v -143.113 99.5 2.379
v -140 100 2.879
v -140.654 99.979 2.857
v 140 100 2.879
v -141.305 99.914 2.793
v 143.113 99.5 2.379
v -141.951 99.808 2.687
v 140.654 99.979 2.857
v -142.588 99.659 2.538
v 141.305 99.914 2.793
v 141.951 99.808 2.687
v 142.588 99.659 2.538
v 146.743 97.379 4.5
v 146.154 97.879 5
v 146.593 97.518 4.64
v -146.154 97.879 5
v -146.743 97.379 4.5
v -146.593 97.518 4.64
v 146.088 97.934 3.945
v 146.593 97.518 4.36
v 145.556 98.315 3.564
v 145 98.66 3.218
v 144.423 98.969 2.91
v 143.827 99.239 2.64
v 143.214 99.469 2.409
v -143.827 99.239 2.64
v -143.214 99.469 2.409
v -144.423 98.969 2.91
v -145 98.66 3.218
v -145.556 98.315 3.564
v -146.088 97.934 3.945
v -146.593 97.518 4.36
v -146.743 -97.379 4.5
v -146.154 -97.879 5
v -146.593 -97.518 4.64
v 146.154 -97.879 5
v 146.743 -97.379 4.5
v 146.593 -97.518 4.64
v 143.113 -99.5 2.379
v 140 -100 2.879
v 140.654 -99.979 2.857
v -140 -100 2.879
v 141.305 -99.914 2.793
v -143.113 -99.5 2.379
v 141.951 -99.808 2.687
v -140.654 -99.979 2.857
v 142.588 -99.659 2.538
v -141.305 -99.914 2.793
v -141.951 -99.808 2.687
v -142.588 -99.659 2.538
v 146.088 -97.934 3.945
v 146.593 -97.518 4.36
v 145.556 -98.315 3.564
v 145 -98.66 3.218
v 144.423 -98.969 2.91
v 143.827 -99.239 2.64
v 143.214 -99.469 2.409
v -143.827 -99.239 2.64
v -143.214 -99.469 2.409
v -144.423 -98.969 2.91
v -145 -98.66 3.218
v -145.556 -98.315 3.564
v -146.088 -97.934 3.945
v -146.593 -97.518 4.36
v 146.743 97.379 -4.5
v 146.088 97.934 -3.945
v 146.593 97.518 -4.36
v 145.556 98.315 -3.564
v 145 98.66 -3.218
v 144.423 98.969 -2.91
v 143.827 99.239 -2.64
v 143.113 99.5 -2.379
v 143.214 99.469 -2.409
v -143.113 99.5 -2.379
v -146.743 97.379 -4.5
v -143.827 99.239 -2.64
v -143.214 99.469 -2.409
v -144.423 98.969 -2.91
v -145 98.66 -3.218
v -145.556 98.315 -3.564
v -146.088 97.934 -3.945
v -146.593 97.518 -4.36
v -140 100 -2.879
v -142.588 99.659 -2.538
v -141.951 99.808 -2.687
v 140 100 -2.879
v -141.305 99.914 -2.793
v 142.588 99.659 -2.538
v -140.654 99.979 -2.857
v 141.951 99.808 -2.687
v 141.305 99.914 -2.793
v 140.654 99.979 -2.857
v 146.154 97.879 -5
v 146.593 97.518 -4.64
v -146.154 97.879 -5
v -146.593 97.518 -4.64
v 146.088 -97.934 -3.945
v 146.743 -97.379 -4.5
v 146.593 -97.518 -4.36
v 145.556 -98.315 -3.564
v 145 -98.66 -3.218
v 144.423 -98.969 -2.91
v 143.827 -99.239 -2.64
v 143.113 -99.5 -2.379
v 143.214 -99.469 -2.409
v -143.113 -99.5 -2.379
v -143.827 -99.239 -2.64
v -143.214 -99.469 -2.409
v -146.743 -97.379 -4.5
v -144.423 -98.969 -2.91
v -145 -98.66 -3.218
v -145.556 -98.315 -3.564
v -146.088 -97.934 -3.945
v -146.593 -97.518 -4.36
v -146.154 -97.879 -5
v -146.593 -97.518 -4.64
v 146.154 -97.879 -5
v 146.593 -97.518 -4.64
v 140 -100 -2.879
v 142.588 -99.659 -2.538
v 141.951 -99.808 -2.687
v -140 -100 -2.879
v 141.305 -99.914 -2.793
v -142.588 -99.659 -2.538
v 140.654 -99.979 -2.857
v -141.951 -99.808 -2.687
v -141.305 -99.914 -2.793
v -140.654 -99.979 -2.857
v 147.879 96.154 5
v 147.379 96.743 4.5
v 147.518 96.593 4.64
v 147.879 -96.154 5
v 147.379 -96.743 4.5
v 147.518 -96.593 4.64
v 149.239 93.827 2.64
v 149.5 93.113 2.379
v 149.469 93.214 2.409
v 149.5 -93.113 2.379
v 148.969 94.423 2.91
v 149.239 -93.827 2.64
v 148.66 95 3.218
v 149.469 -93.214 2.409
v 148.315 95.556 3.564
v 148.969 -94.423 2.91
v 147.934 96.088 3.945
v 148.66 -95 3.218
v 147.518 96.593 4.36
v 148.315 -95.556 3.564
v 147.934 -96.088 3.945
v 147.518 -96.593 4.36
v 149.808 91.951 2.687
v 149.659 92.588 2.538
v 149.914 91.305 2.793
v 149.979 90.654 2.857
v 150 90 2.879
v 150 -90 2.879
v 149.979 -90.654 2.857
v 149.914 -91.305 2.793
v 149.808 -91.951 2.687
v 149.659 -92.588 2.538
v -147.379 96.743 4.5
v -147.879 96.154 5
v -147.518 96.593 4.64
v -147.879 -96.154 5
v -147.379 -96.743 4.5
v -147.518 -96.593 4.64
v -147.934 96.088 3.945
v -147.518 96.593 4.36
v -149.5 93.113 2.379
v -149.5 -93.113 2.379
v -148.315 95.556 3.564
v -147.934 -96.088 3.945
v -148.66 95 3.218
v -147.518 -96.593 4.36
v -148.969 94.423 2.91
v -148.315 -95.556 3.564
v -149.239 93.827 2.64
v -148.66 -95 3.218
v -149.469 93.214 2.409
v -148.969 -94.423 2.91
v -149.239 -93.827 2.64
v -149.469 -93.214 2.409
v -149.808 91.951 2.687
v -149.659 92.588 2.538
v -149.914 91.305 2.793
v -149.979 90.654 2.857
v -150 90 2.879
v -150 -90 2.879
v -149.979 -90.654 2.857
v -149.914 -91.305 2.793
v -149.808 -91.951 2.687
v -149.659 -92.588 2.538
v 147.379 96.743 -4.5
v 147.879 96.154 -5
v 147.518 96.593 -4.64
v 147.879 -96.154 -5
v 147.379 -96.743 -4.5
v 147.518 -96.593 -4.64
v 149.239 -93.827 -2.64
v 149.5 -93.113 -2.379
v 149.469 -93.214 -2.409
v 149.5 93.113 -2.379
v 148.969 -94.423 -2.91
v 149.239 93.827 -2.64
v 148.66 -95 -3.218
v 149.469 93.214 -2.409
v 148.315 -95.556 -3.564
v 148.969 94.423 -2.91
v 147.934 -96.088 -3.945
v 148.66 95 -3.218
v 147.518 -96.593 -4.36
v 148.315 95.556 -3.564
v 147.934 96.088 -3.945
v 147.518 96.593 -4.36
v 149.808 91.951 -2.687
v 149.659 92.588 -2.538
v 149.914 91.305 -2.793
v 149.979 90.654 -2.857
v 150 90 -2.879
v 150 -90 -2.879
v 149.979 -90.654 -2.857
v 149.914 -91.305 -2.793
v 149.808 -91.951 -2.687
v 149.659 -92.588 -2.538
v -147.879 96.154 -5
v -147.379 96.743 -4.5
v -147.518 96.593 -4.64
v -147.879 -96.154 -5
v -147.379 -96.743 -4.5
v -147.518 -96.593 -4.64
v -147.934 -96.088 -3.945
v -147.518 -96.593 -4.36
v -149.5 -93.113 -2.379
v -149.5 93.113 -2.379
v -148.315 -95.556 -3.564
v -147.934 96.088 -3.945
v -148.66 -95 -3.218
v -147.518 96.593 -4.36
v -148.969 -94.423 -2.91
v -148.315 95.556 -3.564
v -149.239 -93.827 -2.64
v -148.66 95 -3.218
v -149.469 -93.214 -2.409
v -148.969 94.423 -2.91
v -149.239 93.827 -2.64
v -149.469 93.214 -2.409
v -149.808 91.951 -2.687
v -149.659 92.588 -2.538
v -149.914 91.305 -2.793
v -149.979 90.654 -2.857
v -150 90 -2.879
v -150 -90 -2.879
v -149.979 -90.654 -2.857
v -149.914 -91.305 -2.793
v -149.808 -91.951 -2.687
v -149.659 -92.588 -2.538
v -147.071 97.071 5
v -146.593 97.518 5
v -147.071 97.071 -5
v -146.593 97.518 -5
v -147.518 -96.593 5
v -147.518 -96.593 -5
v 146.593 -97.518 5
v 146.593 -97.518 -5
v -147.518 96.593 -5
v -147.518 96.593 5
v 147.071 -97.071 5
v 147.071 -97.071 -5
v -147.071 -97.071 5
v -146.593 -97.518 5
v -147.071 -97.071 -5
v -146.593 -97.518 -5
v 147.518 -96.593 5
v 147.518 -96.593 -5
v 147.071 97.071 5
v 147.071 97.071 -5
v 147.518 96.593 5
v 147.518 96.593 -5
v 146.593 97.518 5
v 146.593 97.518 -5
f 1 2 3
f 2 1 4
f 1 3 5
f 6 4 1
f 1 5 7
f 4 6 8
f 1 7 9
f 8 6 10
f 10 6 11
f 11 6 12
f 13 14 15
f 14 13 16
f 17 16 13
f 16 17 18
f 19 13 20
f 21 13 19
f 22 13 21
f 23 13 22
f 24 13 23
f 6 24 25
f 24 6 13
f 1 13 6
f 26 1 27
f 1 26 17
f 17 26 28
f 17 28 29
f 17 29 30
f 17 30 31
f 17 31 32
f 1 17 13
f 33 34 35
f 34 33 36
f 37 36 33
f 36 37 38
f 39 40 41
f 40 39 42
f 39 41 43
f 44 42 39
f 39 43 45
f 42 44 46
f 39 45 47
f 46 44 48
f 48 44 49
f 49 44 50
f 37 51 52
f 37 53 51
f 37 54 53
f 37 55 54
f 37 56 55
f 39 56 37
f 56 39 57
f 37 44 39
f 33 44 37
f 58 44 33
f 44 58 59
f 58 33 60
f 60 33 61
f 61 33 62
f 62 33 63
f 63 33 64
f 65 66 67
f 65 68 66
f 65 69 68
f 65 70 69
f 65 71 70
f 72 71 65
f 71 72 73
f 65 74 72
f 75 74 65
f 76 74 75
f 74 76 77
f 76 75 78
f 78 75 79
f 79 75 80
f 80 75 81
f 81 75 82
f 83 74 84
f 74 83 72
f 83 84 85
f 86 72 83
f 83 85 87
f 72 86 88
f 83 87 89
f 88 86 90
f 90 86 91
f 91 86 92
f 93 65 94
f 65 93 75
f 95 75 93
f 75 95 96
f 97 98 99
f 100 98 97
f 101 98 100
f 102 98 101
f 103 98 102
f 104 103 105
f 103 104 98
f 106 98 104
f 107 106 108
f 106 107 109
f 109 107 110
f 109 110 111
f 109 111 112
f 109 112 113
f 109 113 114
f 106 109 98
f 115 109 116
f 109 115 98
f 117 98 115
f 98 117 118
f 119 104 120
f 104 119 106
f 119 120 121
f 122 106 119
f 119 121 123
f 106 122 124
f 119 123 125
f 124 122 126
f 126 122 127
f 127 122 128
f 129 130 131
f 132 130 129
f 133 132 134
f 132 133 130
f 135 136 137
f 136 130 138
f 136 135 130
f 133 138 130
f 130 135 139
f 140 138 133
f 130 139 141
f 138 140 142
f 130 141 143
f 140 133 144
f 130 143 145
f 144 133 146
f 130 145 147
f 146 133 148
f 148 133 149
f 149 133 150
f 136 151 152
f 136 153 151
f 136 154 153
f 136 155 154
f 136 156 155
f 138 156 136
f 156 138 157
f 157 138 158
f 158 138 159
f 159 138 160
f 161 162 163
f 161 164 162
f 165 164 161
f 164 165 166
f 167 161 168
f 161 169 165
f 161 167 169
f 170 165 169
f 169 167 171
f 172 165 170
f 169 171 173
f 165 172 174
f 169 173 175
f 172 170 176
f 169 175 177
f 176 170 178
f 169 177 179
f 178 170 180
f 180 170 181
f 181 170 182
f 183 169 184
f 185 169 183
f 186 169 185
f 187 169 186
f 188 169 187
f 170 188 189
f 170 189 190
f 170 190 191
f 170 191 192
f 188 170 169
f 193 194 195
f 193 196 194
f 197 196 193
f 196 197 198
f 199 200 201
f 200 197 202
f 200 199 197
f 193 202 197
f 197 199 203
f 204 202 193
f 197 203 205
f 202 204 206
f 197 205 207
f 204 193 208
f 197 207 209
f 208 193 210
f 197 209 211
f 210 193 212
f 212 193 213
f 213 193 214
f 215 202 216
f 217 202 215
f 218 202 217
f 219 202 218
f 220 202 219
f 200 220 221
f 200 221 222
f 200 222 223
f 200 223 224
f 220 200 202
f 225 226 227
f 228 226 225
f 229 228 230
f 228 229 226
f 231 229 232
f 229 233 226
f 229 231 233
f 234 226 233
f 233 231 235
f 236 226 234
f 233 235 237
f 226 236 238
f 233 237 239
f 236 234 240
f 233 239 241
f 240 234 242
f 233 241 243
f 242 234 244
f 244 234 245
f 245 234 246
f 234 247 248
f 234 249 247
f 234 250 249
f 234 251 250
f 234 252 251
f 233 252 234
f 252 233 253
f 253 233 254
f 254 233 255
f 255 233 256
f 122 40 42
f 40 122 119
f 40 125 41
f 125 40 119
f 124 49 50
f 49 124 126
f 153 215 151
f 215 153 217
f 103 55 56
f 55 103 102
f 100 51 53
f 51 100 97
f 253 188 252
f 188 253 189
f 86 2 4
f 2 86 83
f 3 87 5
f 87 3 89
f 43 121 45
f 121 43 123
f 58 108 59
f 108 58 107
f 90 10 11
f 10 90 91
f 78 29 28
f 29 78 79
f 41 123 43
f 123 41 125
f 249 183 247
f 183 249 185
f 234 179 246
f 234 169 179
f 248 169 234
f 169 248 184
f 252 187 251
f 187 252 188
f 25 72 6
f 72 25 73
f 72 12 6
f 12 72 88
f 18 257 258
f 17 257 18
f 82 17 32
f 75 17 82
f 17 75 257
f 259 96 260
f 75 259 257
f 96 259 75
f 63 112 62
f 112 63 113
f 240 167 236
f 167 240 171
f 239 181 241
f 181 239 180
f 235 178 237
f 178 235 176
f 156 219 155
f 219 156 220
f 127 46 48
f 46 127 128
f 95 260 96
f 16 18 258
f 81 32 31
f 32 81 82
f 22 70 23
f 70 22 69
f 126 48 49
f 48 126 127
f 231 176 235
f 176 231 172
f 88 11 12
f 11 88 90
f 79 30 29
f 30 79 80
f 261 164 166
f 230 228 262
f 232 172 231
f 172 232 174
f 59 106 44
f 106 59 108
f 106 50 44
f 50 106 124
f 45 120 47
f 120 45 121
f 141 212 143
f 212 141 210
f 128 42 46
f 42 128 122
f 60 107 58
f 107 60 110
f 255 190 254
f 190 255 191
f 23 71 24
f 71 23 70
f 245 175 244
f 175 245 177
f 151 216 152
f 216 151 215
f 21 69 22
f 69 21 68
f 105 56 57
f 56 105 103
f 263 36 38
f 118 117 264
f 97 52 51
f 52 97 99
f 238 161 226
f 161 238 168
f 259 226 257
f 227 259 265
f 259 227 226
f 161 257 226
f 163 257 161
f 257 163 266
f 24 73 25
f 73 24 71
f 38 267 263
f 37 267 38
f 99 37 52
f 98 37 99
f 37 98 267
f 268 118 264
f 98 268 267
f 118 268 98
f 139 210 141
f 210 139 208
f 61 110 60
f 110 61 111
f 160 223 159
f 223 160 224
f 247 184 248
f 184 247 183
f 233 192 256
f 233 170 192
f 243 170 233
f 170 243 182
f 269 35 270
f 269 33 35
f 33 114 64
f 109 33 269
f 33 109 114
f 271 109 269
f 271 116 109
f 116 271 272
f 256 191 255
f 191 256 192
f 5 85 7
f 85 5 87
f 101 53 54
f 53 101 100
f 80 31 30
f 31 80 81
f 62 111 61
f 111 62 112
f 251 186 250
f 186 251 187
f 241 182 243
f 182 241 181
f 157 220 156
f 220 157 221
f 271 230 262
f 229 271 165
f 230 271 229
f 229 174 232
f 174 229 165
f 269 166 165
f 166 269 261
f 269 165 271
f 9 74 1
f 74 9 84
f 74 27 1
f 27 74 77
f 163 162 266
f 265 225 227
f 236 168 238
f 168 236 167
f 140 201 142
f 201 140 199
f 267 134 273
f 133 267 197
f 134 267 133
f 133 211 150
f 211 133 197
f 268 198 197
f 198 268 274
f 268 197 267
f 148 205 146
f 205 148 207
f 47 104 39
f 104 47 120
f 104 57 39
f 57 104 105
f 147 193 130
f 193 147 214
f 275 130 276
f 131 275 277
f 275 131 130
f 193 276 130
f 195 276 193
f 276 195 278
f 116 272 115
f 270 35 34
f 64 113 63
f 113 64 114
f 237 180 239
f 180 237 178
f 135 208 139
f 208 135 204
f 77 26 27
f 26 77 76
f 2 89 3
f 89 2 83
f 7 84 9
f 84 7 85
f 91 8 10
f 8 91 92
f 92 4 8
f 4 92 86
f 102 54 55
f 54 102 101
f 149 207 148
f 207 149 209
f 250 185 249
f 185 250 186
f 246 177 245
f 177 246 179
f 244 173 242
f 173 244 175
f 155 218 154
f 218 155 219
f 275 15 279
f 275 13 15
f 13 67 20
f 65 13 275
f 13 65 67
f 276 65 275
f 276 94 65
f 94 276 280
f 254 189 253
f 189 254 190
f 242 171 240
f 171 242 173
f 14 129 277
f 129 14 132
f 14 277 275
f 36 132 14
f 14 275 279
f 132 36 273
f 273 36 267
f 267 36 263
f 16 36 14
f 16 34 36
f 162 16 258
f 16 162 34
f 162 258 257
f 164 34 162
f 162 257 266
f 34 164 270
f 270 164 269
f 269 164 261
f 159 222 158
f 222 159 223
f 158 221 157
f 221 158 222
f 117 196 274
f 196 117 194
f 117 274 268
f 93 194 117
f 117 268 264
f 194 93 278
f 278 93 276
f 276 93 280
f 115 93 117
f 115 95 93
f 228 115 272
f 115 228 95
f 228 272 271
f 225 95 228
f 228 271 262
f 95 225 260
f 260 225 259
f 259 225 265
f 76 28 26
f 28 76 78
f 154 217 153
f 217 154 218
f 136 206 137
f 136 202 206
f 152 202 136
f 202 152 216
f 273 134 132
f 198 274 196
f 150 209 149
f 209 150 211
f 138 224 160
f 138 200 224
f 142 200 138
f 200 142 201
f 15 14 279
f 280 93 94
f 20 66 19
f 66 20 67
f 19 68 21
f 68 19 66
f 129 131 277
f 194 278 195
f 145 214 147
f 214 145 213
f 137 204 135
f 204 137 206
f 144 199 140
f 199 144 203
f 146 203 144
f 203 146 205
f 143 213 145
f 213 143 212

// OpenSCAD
// Aluminium tooling plate (single connected solid)

// Parameters
plate_length = 300; //[150:600:1]
plate_width  = 200; //[100:400:1]
plate_thickness = 10; //[5:20:1]
corner_radius = 10; //[5:20:1]
edge_chamfer  = 1;  //[0.5:3:0.5]
overlap = 1;        //[0.5:2:0.5]

$fn = 96;

// Helpers
function clamp(v, lo, hi) = v < lo ? lo : (v > hi ? hi : v);

// Keep features valid for any parameter combination
r = clamp(corner_radius, 0, min(plate_length, plate_width)/2 - 0.01);
c = clamp(edge_chamfer, 0, plate_thickness/2 - 0.01);

// Rounded-rectangle prism via hull of corner cylinders
module rounded_plate(L, W, T, R) {
    hull() {
        for (sx = [-1, 1], sy = [-1, 1])
            translate([sx*(L/2 - R), sy*(W/2 - R), 0])
                cylinder(r=R, h=T, center=true);
    }
}

// Chamfered edges by subtracting 4 long wedges (top and bottom)
module chamfer_cuts(L, W, T, C, ov) {
    // Wedge size: long enough to cover the plate, thick enough to cut
    cutL = L + 2*ov + 2*C;
    cutW = W + 2*ov + 2*C;
    cutH = C + 2*ov;

    // Top chamfers
    zTop =  T/2 - C/2;
    // Bottom chamfers
    zBot = -T/2 + C/2;

    // Along +Y / -Y edges
    for (zpos = [zTop, zBot]) {
        translate([0,  (W/2 + C/2 - ov), zpos])
            rotate([45, 0, 0])
                cube([cutL, cutH, cutH], center=true);

        translate([0, -(W/2 + C/2 - ov), zpos])
            rotate([-45, 0, 0])
                cube([cutL, cutH, cutH], center=true);
    }

    // Along +X / -X edges
    for (zpos = [zTop, zBot]) {
        translate([ (L/2 + C/2 - ov), 0, zpos])
            rotate([0, -45, 0])
                cube([cutH, cutW, cutH], center=true);

        translate([-(L/2 + C/2 - ov), 0, zpos])
            rotate([0, 45, 0])
                cube([cutH, cutW, cutH], center=true);
    }
}

module tooling_plate_complete() {
    difference() {
        rounded_plate(plate_length, plate_width, plate_thickness, r);
        if (c > 0)
            chamfer_cuts(plate_length, plate_width, plate_thickness, c, overlap);
    }
}

// Final Output
color("Silver") tooling_plate_complete();
